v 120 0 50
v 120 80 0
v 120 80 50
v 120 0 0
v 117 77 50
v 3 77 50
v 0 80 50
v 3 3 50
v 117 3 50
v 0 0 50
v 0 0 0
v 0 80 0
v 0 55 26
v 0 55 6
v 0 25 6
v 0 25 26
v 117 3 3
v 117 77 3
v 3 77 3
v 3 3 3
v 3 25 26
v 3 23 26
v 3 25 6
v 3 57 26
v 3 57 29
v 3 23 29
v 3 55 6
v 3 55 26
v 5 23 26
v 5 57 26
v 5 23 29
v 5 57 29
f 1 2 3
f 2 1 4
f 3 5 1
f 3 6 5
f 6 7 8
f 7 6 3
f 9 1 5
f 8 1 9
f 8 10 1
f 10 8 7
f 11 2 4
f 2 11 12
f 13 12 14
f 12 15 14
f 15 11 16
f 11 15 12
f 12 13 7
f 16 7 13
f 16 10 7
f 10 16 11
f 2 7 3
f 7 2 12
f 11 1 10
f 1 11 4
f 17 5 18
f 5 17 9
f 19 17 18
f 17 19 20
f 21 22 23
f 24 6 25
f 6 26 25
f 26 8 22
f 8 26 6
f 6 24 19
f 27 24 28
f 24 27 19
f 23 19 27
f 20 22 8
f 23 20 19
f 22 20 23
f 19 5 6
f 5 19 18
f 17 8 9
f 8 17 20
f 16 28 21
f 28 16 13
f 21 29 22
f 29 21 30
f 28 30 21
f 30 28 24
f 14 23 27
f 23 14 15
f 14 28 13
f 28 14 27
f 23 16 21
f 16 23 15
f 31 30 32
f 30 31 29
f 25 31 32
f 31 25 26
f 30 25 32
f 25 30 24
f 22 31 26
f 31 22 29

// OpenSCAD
$fn = 120;

// ======================
// DIMENSÕES
// ======================

comprimento = 120;
largura = 80;
altura = 50;

parede = 3;

// Abertura menor da caixa.
// A tampa menor correspondente deve ter aba de 29,9 mm x 19,9 mm,
// isto é, 0,05 mm de folga em cada lado.
porta_largura = 30;
porta_altura = 20;

// Altura da abertura
altura_inicio_porta = 6;


// ======================
// CAIXA
// ======================

module caixa() {

    difference() {

        // Corpo externo
        cube([comprimento, largura, altura]);

        // Interior oco
        translate([parede, parede, parede])
            cube([
                comprimento - 2*parede,
                largura - 2*parede,
                altura
            ]);

        // Abertura da portinha
        translate([
            -1,
            (largura - porta_largura)/2,
            altura_inicio_porta
        ])
        cube([
            parede + 2,
            porta_largura,
            porta_altura
        ]);
    }

    // Beiral anti-chuva
    translate([
        0,
        (largura - porta_largura)/2 - 2,
        altura_inicio_porta + porta_altura
    ])
    cube([
        5,
        porta_largura + 4,
        3
    ]);
}


// ======================
// VISUALIZAÇÃO
// ======================

color("white")
caixa();
